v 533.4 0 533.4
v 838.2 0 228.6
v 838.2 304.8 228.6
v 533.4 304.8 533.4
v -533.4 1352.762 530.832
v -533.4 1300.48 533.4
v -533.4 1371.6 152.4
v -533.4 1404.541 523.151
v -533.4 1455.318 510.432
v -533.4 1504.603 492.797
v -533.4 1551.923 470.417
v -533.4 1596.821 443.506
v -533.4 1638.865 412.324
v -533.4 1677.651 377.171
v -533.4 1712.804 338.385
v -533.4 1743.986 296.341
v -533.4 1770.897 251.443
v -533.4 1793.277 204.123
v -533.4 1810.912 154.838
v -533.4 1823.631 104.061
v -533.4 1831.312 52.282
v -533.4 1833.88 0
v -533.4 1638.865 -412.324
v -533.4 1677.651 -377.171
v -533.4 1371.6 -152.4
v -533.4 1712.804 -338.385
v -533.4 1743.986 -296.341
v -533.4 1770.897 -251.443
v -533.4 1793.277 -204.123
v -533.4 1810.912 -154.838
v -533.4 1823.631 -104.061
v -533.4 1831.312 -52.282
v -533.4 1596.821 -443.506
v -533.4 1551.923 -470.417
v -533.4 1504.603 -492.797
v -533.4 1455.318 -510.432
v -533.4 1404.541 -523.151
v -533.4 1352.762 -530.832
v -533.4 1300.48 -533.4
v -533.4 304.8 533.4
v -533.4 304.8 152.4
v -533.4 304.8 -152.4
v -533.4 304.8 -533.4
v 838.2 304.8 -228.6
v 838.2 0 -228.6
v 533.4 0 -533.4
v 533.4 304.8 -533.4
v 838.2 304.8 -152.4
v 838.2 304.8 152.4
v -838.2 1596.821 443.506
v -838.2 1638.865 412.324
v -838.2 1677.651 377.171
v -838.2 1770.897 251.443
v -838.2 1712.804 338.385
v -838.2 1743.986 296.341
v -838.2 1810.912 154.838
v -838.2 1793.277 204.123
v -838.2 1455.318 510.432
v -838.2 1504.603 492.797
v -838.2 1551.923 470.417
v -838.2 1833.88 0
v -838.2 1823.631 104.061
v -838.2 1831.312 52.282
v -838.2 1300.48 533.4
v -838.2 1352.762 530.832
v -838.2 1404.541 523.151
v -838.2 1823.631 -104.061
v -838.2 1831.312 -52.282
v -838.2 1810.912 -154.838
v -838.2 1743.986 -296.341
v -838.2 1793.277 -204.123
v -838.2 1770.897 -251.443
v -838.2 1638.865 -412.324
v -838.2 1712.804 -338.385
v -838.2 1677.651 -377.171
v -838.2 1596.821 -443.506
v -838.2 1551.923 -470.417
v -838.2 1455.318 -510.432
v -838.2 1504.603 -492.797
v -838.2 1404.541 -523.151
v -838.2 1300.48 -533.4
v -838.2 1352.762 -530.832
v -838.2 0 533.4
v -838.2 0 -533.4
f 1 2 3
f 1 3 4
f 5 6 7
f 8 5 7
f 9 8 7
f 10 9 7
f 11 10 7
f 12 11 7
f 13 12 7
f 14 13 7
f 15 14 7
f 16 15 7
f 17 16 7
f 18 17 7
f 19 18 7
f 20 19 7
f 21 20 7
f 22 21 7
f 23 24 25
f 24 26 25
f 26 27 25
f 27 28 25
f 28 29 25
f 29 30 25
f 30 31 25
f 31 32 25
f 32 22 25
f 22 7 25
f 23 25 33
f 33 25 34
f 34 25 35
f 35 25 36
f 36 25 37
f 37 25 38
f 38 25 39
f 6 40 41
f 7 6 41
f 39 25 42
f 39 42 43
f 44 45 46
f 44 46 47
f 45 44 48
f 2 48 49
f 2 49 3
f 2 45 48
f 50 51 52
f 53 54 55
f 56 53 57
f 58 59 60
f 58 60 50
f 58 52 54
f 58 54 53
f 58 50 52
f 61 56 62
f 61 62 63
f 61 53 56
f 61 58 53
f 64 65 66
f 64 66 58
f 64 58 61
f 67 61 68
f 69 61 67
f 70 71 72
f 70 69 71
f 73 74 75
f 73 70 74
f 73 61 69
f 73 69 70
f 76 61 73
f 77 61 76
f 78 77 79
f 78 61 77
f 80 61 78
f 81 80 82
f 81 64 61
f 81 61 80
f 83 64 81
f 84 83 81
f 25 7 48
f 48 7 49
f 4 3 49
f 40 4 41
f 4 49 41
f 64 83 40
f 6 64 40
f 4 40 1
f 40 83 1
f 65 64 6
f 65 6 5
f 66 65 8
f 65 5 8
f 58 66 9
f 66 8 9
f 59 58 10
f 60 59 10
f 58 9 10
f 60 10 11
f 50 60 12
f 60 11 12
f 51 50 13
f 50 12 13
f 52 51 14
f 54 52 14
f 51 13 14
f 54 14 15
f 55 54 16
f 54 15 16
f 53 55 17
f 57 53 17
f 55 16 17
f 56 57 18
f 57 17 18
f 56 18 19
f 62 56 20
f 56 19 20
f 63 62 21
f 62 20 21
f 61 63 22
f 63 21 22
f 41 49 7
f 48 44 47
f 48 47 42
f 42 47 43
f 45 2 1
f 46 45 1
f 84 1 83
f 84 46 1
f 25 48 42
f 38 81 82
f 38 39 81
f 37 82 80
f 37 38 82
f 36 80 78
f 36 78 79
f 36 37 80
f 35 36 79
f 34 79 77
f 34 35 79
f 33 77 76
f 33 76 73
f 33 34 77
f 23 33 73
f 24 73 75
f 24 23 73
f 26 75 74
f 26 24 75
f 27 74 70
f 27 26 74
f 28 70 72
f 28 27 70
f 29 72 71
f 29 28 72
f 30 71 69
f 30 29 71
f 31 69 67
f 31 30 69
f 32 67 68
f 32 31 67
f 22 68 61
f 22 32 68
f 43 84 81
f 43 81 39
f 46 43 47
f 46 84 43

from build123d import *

# Parameters (mm, degrees)
BOSS_EXTRUDE1_DEPTH = 304.8
CHAMFER1_SIZE       = 304.8
SKETCH3_W           = 304.8
SKETCH3_H           = 1066.8
BOSS_EXTRUDE2_DEPTH = 1529.08
FILLET1_R           = 533.4
BOSS_EXTRUDE3_DEPTH = 152.4


with BuildPart() as part:
    # Sketch1 → Boss-Extrude1 (new body)
    with BuildSketch(Plane(origin=(0, 0, 0), x_dir=(1, 0, 0), z_dir=(0, 1, 0))):
        Polygon((838.2, -228.6), (533.4, -533.4), (-838.2, -533.4), (-838.2, 533.4), (838.2, 533.4), align=None)
    extrude(amount=BOSS_EXTRUDE1_DEPTH)

    # Chamfer1
    chamfer1_edges = [part.edges().sort_by_distance(p)[0] for p in [
        (838.2, 152.4, -533.4),
    ]]
    chamfer(chamfer1_edges, length=CHAMFER1_SIZE)

    # Sketch3 → Boss-Extrude2 (add)
    with BuildSketch(Plane(origin=(0, 304.8, 0), x_dir=(1, 0, 0), z_dir=(0, 1, 0))):
        with Locations((-685.8, 0)):
            Rectangle(SKETCH3_W, SKETCH3_H)
    extrude(amount=BOSS_EXTRUDE2_DEPTH)

    # Fillet1
    fillet1_edges = [part.edges().sort_by_distance(p)[0] for p in [
        (-685.8, 1833.88, -533.4),
        (-685.8, 1833.88, 533.4),
    ]]
    fillet(fillet1_edges, radius=FILLET1_R - 0.0001)  # a hair under: the kernel refuses the full size

    # Sketch4 → Boss-Extrude3 (add, symmetric)
    with BuildSketch(Plane.XY):
        Polygon((-533.4, 1371.6), (838.2, 304.8), (-533.4, 304.8), align=None)
    extrude(amount=BOSS_EXTRUDE3_DEPTH, both=True)


solid = part.part
